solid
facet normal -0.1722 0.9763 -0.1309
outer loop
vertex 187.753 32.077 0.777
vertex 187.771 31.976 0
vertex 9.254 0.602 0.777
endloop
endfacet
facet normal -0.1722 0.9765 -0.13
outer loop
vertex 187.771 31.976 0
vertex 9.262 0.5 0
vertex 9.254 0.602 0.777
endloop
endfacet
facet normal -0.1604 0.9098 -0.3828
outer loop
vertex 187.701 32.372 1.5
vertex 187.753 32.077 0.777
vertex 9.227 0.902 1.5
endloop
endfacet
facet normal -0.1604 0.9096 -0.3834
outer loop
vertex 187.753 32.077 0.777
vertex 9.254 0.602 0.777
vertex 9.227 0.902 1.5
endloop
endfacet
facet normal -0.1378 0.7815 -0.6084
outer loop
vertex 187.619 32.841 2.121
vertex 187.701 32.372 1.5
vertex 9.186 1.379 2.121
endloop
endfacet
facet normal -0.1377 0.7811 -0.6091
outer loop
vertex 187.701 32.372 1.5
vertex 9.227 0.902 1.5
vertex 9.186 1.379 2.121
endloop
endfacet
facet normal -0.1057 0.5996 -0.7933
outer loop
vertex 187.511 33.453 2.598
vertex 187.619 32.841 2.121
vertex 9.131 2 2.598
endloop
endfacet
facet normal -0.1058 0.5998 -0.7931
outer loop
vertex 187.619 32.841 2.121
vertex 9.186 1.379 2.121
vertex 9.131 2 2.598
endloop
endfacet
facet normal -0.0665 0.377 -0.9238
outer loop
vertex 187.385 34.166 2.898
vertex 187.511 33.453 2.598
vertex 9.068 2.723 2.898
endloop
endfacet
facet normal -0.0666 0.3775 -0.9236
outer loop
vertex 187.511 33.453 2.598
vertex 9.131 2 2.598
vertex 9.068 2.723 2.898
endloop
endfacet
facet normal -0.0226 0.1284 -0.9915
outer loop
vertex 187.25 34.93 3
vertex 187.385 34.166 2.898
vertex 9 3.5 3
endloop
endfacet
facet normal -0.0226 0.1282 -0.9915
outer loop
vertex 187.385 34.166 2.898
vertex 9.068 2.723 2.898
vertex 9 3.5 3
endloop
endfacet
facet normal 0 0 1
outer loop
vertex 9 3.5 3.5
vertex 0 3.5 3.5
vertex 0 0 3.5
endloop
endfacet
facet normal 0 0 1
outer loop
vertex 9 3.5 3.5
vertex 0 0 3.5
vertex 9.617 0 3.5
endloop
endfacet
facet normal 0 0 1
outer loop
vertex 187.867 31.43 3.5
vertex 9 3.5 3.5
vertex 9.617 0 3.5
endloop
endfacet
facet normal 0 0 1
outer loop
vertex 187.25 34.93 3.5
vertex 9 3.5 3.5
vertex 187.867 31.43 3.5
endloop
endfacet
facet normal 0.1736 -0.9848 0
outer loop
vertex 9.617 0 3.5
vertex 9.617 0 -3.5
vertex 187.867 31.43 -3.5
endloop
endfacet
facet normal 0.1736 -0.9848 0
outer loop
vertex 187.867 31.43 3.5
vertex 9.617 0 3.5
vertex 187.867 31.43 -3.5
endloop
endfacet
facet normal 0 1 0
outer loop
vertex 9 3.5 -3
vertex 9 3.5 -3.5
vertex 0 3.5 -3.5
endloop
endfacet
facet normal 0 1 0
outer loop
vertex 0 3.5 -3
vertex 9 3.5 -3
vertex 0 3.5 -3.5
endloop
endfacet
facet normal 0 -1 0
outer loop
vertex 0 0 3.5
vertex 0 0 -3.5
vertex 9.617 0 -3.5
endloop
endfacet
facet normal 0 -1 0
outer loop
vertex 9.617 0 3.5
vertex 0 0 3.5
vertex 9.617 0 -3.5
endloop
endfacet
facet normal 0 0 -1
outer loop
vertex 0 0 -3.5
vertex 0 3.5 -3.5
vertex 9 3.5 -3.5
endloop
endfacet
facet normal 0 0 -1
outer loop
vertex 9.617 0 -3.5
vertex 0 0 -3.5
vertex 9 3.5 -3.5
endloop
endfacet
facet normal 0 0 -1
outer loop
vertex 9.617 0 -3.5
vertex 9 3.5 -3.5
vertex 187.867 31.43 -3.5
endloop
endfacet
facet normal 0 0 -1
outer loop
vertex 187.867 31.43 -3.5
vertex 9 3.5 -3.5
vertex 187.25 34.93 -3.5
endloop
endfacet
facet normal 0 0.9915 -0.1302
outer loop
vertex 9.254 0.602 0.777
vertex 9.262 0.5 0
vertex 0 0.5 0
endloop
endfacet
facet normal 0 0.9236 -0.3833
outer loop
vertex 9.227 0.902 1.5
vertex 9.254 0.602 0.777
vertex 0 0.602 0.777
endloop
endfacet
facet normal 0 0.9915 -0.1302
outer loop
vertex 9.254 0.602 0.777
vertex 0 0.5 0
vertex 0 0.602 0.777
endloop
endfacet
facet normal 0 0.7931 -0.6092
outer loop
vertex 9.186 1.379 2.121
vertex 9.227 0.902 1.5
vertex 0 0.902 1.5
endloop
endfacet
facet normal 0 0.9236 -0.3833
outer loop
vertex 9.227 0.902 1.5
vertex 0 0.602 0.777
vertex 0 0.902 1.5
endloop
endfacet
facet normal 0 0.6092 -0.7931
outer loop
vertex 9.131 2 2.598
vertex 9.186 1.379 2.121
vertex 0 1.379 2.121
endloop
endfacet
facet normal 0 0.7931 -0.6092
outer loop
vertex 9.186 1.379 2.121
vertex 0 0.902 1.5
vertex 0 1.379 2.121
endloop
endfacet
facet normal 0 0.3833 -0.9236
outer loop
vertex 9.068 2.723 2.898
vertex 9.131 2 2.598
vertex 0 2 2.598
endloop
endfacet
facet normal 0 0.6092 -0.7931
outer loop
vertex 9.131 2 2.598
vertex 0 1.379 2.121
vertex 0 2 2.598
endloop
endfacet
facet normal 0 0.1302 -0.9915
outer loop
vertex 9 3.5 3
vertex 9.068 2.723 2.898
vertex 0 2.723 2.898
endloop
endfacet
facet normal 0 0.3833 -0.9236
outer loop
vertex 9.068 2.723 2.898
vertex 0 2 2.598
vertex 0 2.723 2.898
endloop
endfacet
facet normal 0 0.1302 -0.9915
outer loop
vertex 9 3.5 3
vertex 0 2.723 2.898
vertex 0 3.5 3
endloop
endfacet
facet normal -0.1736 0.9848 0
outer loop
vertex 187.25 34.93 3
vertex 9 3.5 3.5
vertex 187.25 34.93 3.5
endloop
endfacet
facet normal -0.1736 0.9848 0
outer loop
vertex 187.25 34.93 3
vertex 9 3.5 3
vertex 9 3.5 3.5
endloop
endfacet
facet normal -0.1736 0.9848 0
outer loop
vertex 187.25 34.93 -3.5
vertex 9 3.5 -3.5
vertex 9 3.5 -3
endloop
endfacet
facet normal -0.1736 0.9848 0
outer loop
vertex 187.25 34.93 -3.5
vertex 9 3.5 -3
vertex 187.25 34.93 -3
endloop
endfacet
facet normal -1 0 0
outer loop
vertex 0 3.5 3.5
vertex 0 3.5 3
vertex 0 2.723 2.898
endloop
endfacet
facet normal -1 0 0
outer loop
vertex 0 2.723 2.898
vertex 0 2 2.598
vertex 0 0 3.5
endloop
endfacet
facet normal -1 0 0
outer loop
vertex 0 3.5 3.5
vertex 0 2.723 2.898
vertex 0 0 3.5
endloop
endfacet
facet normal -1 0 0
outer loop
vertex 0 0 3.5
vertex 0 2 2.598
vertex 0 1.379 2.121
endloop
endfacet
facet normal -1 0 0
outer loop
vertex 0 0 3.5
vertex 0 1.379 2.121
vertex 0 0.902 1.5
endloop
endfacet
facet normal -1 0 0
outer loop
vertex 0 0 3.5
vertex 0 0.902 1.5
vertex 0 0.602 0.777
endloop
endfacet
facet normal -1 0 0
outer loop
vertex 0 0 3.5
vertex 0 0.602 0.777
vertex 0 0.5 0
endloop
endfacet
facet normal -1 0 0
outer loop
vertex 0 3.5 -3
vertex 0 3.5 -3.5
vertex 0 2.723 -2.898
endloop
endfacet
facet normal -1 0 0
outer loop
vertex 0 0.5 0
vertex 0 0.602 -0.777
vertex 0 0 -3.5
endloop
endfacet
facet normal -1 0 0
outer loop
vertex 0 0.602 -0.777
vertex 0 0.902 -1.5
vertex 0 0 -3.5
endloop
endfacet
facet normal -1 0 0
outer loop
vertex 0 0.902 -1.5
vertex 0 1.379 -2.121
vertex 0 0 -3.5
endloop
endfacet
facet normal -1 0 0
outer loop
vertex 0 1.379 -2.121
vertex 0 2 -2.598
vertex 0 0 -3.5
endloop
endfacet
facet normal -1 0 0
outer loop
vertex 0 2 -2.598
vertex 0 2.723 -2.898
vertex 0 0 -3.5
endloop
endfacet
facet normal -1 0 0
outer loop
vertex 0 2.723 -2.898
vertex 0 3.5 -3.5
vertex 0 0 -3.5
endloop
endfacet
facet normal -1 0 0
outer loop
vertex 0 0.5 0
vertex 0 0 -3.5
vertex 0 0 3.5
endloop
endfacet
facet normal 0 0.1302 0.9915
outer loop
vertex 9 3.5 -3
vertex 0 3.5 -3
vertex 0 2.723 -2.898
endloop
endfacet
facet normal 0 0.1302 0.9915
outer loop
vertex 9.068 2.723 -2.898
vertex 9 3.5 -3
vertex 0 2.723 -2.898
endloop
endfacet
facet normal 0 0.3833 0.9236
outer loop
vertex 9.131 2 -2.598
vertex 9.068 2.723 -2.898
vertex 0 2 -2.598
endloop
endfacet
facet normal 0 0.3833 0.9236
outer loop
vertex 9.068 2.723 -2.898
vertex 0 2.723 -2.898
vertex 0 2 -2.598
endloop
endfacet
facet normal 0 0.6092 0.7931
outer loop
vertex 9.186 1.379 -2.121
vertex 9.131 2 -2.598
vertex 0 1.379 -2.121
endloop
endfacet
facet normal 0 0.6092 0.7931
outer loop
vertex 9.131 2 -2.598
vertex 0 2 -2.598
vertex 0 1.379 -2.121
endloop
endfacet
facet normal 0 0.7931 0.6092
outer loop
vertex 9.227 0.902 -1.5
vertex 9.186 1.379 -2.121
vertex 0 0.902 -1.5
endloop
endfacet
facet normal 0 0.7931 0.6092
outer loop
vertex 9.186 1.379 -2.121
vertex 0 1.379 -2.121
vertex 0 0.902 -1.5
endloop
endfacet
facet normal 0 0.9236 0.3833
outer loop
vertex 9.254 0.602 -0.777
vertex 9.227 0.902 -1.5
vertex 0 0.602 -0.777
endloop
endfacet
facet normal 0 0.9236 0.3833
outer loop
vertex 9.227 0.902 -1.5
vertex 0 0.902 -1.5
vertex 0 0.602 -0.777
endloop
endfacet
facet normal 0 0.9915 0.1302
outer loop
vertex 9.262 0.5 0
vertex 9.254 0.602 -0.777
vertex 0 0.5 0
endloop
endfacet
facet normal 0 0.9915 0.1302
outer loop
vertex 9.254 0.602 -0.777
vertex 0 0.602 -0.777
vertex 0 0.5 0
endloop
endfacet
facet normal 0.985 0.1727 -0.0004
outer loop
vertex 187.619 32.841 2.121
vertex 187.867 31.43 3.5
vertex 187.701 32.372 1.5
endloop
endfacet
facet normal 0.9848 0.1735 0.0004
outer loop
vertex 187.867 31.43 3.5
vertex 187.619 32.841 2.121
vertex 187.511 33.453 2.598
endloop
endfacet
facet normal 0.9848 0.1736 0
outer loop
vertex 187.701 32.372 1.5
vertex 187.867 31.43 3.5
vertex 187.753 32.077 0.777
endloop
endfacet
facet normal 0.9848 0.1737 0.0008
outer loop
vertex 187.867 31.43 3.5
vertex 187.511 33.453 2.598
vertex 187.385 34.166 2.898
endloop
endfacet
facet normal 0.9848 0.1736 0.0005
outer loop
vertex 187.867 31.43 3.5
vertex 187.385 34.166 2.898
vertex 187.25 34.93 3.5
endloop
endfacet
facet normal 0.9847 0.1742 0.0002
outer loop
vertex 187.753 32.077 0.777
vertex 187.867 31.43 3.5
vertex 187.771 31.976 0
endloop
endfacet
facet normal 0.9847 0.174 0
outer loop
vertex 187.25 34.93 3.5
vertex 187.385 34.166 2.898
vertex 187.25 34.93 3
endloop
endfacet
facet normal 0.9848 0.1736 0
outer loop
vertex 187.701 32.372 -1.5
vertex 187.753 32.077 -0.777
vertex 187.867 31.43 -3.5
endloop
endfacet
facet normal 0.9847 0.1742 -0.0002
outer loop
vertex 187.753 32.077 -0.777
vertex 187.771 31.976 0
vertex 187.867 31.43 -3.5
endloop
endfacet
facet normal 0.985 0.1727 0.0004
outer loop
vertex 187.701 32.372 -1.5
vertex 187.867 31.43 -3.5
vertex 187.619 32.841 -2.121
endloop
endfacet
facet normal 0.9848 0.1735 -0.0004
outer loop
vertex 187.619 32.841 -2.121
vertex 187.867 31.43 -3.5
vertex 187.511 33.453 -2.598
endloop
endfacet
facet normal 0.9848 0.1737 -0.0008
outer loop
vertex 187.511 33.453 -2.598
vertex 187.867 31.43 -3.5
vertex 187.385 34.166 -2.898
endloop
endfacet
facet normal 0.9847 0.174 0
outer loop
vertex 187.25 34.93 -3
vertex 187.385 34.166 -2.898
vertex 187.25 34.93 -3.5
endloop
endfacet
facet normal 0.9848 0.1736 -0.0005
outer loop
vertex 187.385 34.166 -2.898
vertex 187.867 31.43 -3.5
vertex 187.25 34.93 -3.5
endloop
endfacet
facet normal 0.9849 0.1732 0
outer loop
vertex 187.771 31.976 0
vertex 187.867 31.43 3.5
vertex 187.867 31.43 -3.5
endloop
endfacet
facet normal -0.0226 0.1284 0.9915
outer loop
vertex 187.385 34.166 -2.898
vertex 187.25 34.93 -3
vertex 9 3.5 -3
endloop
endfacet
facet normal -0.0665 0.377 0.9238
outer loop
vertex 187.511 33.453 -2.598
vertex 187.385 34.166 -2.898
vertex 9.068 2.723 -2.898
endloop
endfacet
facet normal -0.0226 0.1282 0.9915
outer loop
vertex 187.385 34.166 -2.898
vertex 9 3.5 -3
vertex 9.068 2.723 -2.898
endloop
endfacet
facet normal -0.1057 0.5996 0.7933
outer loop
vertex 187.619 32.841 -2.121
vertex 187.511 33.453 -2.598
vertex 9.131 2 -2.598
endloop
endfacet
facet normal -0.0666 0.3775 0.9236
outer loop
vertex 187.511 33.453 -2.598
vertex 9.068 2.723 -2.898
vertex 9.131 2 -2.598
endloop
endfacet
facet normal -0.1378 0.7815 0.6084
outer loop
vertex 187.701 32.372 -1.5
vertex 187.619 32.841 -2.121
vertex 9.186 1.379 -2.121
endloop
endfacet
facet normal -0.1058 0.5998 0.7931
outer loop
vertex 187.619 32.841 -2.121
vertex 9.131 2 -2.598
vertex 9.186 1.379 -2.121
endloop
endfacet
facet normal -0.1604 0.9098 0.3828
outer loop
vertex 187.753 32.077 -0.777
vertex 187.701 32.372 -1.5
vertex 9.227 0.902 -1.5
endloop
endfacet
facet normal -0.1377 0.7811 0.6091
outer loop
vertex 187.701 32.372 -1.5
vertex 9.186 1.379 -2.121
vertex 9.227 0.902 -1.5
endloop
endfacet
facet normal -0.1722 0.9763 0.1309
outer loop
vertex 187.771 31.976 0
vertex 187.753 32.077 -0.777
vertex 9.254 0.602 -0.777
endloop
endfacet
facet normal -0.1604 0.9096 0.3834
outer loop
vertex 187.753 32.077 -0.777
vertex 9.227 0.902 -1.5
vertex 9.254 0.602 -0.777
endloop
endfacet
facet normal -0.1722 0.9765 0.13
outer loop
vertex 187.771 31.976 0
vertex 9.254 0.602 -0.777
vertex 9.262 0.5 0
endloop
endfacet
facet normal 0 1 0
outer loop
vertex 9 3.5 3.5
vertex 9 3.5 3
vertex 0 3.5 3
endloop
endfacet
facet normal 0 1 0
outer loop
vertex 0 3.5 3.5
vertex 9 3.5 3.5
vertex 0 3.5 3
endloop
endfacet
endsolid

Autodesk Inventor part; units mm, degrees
ref_plane "YZ Plane" through (0, 0, 0) normal (1, 0, 0) x (0, 1, 0)
ref_plane "XZ Plane" through (0, 0, 0) normal (0, 1, 0) x (-1, 0, 0)
ref_plane "XY Plane" through (0, 0, 0) normal (0, 0, 1) x (1, 0, 0)
sketch "Esboço1" plane through (0, 0, 0) normal (0, 0, 1) x (1, 0, 0)
  line L0 (0, 0) -> (9, 0)
  line L1 (9, 0) -> (9, 3.5)
  line L2 (9, 3.5) -> (0, 3.5)
  line L3 (0, 3.5) -> (0, 0)
  line L4 (9, 3.5) -> (9.6171, 0)
  line L5 (9.6171, 0) -> (9, 0)
  line L6 (9.6171, 0) -> (187.8673, 31.4303)
  line L7 (9, 3.5) -> (187.2502, 34.9303)
  line L8 (187.8673, 31.4303) -> (187.2502, 34.9303)
  point P0 (0, 1.75)
  point P1 (4.5, 0)
  dimension "d0" = 3.5
  dimension "d1" = 10
  dimension "d2" = 181
  dimension "d17" = 9
extrude "Extrusão1" add sketch "Esboço1" along normal mid plane 7
sketch "Esboço4" plane through (0, 0, 0) normal (0, 0, 1) x (1, 0, 0)
  line L0 (187.2502, 34.9303) -> (9, 3.5) projected
  line L1 (9, 3.5) -> (0, 3.5) projected
  line L2 (187.7711, 31.9759) -> (9.2625, 0.5)
  line L3 (9.2625, 0.5) -> (0, 0.5)
  line L4 (187.7711, 31.9759) -> (187.2502, 34.9303)
  line L5 (0, 0.5) -> (0, 3.5)
  point P0 (0, 0)
  dimension "d13" = 3
extrude "Extrusão4" cut sketch "Esboço4" along normal mid plane 6
fillet "Arredondamento1" radius 3 4 edges at (98.5168, 16.2379, 3) (4.6312, 0.5, 3) (4.6312, 0.5, -3) (98.5168, 16.2379, -3)
properties part number "Inverter sentido bolinha"
